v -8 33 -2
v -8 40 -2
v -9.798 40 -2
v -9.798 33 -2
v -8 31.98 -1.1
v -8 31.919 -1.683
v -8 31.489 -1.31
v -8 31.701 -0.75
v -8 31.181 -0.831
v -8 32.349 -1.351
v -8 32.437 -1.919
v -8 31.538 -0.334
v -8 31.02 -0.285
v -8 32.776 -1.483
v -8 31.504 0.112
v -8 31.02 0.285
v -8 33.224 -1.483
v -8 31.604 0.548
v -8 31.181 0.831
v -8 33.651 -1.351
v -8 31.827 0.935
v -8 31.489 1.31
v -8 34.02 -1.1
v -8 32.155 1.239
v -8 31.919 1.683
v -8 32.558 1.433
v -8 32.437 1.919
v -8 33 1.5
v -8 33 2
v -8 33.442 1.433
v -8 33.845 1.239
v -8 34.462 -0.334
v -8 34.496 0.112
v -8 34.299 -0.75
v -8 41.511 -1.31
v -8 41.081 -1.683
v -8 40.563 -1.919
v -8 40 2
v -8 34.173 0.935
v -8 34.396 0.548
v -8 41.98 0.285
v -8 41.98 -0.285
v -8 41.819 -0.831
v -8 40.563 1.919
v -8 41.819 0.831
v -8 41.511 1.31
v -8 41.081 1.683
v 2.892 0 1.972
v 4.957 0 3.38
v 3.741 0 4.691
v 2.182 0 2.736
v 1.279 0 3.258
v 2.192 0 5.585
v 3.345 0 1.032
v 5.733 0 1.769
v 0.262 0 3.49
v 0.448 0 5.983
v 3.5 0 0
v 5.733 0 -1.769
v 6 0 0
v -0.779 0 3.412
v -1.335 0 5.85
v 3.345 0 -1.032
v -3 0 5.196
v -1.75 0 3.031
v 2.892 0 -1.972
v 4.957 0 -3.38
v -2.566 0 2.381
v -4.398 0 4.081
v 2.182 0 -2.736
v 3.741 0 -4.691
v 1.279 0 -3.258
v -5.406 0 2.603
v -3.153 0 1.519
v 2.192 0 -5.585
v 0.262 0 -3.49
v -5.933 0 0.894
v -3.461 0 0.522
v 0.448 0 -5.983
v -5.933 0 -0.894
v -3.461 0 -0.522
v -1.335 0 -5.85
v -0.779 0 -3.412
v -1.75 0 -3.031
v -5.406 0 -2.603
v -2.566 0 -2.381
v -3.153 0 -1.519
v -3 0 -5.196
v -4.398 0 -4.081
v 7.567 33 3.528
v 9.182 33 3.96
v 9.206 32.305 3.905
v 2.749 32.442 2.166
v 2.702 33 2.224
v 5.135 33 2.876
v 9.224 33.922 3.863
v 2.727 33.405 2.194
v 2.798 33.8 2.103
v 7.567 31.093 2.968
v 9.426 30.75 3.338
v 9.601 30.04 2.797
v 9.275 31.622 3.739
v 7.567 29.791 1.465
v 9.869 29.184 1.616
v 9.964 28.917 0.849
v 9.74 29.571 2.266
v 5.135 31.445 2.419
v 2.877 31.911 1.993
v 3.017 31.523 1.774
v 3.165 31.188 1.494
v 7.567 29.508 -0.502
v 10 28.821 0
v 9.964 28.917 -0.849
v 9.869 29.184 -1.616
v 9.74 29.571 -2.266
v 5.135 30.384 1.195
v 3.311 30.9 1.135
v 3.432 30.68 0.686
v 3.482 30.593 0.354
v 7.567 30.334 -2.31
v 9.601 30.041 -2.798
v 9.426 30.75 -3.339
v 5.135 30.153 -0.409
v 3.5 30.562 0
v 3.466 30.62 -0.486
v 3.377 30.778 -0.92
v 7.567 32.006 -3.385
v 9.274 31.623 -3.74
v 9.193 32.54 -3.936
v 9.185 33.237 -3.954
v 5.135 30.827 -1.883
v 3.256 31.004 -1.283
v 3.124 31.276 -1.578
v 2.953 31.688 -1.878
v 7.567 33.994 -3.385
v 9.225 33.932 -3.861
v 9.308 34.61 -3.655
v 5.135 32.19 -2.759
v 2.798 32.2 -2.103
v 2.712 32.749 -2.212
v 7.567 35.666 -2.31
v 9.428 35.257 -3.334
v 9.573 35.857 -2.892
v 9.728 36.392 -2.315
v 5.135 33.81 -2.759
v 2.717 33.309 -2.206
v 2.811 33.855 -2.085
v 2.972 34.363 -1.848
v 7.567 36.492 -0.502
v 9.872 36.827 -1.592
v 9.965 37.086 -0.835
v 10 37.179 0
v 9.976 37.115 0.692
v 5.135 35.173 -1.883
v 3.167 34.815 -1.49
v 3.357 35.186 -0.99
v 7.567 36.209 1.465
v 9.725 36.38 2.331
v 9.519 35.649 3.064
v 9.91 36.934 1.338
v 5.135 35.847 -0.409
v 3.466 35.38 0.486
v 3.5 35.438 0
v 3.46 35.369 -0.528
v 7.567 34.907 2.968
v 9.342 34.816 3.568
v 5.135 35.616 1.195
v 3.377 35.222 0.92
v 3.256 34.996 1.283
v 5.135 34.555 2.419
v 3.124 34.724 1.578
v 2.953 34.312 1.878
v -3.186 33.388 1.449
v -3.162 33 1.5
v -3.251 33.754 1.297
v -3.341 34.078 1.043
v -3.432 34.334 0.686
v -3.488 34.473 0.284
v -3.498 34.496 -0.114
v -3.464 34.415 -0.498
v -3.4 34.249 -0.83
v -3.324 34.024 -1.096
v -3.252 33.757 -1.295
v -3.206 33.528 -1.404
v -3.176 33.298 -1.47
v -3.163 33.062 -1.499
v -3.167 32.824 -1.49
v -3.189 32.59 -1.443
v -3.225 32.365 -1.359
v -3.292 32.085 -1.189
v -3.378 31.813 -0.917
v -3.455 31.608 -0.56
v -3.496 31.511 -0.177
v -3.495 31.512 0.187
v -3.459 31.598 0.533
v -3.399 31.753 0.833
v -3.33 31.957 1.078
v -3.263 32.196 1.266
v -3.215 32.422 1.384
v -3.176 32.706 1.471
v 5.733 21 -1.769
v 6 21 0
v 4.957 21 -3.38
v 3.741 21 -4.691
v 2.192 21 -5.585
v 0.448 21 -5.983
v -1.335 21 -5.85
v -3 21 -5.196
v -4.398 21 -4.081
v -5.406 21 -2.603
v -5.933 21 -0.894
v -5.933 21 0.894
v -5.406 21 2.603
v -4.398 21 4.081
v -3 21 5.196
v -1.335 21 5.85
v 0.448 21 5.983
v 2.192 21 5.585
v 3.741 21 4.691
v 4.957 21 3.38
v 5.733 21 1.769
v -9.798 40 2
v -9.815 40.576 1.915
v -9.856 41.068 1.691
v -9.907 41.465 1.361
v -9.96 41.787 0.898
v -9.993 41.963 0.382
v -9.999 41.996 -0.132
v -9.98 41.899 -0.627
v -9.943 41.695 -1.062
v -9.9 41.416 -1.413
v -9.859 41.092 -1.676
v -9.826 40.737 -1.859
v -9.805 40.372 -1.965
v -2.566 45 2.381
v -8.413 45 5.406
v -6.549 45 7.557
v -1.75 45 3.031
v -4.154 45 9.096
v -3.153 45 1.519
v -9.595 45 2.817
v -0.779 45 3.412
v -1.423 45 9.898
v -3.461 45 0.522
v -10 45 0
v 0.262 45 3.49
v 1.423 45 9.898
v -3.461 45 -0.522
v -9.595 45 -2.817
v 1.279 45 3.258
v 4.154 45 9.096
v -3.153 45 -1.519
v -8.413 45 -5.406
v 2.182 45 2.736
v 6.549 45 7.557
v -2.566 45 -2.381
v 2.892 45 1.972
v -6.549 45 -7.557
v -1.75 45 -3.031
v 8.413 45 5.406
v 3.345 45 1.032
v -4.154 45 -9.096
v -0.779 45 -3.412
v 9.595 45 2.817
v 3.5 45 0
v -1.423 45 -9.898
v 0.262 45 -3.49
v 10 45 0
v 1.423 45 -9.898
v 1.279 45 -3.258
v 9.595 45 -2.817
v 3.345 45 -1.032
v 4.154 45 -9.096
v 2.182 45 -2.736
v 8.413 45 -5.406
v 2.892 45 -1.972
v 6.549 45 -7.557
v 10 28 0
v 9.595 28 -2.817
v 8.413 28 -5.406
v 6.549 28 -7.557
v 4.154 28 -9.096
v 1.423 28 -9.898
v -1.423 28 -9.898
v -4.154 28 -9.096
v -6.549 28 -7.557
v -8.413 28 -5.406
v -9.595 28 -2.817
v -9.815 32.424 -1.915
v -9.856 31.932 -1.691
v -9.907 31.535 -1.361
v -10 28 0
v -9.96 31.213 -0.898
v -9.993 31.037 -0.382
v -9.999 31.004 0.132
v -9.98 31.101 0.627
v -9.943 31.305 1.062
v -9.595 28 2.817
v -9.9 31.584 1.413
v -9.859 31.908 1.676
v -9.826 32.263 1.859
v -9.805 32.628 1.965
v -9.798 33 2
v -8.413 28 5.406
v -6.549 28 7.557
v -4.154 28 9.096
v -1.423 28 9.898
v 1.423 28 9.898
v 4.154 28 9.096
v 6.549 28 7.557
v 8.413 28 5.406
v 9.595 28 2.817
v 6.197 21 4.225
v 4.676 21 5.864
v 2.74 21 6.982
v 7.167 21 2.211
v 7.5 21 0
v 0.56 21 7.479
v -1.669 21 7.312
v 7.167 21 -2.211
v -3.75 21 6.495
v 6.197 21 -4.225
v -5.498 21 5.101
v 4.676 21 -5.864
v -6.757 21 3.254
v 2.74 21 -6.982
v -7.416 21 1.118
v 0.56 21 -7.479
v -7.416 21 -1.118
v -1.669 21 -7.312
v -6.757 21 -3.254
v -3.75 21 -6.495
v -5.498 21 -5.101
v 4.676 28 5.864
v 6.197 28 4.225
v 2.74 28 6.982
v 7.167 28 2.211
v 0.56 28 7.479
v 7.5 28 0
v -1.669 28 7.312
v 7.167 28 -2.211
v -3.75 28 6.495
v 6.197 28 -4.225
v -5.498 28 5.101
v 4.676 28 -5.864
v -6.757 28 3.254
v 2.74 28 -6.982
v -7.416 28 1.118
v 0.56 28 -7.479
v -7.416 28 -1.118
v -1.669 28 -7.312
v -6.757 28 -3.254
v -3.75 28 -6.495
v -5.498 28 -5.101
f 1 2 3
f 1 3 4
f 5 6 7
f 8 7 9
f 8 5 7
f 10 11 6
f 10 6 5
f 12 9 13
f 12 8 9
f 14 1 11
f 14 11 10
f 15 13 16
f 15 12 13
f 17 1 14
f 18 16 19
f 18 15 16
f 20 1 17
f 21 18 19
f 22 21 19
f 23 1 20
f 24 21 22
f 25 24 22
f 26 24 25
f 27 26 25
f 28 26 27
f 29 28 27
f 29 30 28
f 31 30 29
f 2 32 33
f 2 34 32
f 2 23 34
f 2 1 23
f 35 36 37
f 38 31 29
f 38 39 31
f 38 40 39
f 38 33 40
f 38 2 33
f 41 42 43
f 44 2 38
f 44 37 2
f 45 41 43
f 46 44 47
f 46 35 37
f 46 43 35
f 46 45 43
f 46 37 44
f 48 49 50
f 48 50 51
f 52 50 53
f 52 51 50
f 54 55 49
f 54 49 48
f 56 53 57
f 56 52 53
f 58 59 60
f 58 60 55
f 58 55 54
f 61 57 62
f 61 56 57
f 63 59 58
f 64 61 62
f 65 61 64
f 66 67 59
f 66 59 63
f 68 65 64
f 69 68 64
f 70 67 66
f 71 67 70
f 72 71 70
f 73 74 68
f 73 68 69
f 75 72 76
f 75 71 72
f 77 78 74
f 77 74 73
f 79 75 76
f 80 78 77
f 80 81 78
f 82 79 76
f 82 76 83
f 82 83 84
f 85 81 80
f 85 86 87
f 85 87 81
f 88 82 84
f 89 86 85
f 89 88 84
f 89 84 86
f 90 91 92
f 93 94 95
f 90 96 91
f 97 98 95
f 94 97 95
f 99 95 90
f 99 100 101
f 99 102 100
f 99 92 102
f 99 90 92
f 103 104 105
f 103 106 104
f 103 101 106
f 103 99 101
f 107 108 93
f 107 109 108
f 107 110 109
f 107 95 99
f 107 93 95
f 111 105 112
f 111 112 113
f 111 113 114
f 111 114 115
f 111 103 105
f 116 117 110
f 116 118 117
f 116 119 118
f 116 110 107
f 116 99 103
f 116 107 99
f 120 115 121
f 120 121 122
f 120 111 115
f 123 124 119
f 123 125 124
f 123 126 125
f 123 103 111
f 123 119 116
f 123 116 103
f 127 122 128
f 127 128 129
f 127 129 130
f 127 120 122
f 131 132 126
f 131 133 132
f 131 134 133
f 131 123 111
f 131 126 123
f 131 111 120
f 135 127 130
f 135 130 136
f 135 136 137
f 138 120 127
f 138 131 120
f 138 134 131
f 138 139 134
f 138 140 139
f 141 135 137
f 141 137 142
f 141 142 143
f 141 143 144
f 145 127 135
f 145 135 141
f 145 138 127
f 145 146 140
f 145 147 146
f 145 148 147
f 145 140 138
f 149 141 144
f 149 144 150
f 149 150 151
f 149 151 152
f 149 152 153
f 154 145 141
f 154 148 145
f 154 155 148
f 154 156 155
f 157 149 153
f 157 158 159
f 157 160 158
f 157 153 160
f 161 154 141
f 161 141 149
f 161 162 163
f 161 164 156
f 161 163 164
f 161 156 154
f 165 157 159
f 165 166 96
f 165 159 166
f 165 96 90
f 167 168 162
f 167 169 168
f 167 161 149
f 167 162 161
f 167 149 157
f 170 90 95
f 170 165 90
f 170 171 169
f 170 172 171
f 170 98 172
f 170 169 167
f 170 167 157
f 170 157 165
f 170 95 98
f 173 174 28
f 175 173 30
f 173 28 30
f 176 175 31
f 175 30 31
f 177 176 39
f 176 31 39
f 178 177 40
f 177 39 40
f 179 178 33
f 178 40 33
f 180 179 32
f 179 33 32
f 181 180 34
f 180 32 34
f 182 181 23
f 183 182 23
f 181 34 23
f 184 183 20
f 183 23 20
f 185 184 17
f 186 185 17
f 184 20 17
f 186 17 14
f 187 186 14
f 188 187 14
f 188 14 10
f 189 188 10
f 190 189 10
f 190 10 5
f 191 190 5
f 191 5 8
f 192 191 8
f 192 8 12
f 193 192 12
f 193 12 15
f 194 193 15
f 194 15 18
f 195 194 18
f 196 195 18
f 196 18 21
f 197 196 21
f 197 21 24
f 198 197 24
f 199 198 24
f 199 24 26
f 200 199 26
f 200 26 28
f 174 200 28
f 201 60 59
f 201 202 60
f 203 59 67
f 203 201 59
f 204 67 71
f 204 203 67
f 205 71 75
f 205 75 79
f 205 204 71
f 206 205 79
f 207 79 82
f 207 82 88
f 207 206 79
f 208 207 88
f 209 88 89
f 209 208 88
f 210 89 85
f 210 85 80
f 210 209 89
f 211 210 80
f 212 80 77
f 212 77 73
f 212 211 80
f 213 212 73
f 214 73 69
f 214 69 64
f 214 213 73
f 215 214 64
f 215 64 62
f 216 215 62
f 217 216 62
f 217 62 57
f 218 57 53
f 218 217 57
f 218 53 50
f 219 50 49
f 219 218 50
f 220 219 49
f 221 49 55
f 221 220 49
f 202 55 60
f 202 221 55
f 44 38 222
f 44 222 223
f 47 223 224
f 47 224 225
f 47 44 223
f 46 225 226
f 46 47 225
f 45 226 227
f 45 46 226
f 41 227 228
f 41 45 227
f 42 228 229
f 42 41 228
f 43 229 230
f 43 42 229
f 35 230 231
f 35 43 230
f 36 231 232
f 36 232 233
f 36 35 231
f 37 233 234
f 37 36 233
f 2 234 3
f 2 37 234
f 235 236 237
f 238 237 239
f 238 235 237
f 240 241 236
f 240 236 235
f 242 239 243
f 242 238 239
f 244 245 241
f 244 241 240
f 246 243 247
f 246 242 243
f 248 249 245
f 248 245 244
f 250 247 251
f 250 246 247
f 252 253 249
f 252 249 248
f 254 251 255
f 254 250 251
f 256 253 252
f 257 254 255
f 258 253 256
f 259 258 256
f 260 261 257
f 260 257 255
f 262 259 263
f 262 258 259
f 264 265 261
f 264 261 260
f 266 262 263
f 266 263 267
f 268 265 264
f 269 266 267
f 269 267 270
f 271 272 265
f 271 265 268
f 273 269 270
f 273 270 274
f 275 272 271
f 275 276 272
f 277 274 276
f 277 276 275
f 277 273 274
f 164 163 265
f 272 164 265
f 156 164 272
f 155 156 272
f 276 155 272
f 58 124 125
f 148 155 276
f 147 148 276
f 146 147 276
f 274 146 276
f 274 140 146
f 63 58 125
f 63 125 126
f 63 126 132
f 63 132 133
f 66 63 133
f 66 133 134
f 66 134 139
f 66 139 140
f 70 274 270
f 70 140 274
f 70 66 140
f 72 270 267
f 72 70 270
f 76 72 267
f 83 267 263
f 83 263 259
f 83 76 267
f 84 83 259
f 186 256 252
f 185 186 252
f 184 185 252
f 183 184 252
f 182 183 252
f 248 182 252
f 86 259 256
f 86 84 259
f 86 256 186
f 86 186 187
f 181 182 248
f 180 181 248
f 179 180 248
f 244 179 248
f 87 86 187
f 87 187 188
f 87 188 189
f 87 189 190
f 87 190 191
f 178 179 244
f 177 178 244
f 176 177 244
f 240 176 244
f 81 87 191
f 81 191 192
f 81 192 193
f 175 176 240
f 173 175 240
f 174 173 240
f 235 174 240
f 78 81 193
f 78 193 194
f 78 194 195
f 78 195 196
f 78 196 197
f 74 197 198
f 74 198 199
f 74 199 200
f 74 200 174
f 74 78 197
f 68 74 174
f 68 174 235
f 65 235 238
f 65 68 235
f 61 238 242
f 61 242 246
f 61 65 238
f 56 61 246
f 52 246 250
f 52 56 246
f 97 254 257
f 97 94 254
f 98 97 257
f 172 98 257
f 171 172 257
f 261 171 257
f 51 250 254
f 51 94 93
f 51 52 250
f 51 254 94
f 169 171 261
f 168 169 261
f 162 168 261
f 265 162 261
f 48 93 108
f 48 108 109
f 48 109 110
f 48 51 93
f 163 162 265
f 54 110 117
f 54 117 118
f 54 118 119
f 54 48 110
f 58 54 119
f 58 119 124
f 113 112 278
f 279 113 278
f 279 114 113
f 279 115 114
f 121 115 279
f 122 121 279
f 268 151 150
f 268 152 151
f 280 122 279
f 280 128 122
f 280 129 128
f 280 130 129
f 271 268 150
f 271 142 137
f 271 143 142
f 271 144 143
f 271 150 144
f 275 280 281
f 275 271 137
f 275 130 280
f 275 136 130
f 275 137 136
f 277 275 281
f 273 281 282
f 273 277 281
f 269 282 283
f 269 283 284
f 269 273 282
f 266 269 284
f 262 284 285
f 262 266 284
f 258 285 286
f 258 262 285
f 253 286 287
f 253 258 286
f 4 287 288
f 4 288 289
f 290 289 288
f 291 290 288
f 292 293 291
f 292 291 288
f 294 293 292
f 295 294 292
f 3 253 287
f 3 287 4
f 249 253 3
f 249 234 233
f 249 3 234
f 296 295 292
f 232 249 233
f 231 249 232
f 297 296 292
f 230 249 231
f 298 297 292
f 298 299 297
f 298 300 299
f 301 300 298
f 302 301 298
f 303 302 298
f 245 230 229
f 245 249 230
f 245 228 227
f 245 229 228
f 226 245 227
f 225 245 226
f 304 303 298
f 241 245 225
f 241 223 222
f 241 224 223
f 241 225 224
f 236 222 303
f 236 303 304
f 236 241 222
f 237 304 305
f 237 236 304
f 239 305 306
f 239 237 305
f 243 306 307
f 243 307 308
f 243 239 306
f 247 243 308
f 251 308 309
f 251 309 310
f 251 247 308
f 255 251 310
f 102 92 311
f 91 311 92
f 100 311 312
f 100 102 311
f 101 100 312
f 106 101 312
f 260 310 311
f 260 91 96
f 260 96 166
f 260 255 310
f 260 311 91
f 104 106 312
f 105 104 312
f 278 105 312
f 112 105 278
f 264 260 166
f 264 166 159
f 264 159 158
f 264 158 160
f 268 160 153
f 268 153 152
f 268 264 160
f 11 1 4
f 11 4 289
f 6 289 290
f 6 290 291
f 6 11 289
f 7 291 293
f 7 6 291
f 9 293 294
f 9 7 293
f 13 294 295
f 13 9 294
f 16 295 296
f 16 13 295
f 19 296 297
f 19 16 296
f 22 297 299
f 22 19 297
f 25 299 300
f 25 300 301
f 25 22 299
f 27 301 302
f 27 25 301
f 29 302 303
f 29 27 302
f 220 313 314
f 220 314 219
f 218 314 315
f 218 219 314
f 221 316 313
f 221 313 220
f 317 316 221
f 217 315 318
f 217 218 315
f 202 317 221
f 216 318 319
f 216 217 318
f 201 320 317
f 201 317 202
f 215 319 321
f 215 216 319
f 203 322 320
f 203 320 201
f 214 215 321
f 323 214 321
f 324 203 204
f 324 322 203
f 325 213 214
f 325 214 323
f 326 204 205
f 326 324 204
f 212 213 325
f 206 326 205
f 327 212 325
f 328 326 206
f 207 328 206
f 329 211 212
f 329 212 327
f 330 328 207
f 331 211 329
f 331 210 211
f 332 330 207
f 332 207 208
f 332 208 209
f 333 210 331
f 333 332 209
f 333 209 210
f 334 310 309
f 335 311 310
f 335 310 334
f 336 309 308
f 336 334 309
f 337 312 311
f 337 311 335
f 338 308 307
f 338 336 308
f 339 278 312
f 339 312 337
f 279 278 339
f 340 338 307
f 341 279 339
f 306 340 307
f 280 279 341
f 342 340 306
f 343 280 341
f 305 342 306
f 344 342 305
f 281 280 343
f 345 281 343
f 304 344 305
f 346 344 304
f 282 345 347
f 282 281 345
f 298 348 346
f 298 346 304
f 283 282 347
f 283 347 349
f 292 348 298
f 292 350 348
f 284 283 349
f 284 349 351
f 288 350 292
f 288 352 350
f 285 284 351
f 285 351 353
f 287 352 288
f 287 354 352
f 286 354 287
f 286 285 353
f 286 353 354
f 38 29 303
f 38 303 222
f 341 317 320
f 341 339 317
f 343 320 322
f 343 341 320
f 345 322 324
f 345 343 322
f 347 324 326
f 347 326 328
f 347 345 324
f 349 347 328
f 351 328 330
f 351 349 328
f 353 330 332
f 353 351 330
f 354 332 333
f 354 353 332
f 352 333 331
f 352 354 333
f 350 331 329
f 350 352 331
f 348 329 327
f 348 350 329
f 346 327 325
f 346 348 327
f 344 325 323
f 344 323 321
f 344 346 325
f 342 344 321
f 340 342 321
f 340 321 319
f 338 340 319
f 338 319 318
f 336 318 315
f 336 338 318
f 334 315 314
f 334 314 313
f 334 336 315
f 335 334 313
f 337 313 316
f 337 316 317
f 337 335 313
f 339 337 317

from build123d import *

# Parameters (mm, degrees)
CUT_EXTRUDE2_START      = -8
CUT_EXTRUDE2_DEPTH      = 10
CUT_EXTRUDE3_REACH      = 51.487
CUT_EXTRUDE3_END_RADIUS = 3.5
SKETCH3_R               = 1.5
SKETCH4_R               = 1.5
CUT_EXTRUDE5_DEPTH      = 10
CUT_EXTRUDE5_DRAFT      = -15


with BuildPart() as part:
    # Sketch1 → Revolve1 (revolve)
    with BuildSketch(Plane.XY):
        Polygon((3.5, 0), (6, 0), (6, 21), (7.5, 21), (7.5, 28), (10, 28), (10, 45), (3.5, 45), align=None)
    revolve(axis=Axis((0, -1000, 0), (0, 1, 0)))

    # Sketch2 → Cut-Extrude2 (cut)
    with BuildSketch(Plane(origin=(0, 0, 0), x_dir=(0, 0, -1), z_dir=(1, 0, 0)).offset(CUT_EXTRUDE2_START)):
        with BuildLine():
            Line((2, 40), (2, 33))
            ThreePointArc((2, 33), (0, 31), (-2, 33))
            Line((-2, 33), (-2, 40))
            ThreePointArc((-2, 40), (0, 42), (2, 40))
        make_face()
    extrude(amount=-CUT_EXTRUDE2_DEPTH, mode=Mode.SUBTRACT)

    # Cut-Extrude3: up to this cylinder (the profile starts outside it)
    cut_extrude3_end = Plane(origin=(0, 33, 0), z_dir=(0, -1, 0)) * Cylinder(CUT_EXTRUDE3_END_RADIUS, 110.974, mode=Mode.PRIVATE)
    # Sketch3 → Cut-Extrude3 (cut, up to the surface)
    with BuildSketch(Plane.ZY.offset(8), mode=Mode.PRIVATE) as cut_extrude3_sk1:
        with Locations((0, 33)):
            Circle(SKETCH3_R)
    cut_extrude3_tool1 = extrude(cut_extrude3_sk1.sketch, amount=-CUT_EXTRUDE3_REACH, mode=Mode.PRIVATE) - cut_extrude3_end
    add(cut_extrude3_tool1.solids().sort_by_distance((-8, 33, 0))[0], mode=Mode.SUBTRACT)


with BuildPart() as cut_extrude5_tool:
    # Sketch4 → Cut-Extrude5 (with draft: the straight prism first)
    with BuildSketch(Plane(origin=(0, 0, 0), x_dir=(0, 0, -1), z_dir=(1, 0, 0))):
        with Locations(Location((0, 33, 0), (0, 0, 180))):
            Circle(SKETCH4_R)
    extrude(amount=CUT_EXTRUDE5_DEPTH)
    # Cut-Extrude5: the draft: its side faces are tilted about the plane it starts from
    cut_extrude5_sides = [cut_extrude5_tool.faces().sort_by_distance(p)[0] for p in [
        (5, 33, -1.5),
    ]]
    draft(cut_extrude5_sides, Plane(origin=(0, 0, 0), x_dir=(0, 0, -1), z_dir=(1, 0, 0)), CUT_EXTRUDE5_DRAFT)


with BuildPart() as part_1:
    add(part.part)

    # Cut-Extrude5: cut by cut_extrude5_tool
    add(cut_extrude5_tool.part, mode=Mode.SUBTRACT)


solid = part_1.part
